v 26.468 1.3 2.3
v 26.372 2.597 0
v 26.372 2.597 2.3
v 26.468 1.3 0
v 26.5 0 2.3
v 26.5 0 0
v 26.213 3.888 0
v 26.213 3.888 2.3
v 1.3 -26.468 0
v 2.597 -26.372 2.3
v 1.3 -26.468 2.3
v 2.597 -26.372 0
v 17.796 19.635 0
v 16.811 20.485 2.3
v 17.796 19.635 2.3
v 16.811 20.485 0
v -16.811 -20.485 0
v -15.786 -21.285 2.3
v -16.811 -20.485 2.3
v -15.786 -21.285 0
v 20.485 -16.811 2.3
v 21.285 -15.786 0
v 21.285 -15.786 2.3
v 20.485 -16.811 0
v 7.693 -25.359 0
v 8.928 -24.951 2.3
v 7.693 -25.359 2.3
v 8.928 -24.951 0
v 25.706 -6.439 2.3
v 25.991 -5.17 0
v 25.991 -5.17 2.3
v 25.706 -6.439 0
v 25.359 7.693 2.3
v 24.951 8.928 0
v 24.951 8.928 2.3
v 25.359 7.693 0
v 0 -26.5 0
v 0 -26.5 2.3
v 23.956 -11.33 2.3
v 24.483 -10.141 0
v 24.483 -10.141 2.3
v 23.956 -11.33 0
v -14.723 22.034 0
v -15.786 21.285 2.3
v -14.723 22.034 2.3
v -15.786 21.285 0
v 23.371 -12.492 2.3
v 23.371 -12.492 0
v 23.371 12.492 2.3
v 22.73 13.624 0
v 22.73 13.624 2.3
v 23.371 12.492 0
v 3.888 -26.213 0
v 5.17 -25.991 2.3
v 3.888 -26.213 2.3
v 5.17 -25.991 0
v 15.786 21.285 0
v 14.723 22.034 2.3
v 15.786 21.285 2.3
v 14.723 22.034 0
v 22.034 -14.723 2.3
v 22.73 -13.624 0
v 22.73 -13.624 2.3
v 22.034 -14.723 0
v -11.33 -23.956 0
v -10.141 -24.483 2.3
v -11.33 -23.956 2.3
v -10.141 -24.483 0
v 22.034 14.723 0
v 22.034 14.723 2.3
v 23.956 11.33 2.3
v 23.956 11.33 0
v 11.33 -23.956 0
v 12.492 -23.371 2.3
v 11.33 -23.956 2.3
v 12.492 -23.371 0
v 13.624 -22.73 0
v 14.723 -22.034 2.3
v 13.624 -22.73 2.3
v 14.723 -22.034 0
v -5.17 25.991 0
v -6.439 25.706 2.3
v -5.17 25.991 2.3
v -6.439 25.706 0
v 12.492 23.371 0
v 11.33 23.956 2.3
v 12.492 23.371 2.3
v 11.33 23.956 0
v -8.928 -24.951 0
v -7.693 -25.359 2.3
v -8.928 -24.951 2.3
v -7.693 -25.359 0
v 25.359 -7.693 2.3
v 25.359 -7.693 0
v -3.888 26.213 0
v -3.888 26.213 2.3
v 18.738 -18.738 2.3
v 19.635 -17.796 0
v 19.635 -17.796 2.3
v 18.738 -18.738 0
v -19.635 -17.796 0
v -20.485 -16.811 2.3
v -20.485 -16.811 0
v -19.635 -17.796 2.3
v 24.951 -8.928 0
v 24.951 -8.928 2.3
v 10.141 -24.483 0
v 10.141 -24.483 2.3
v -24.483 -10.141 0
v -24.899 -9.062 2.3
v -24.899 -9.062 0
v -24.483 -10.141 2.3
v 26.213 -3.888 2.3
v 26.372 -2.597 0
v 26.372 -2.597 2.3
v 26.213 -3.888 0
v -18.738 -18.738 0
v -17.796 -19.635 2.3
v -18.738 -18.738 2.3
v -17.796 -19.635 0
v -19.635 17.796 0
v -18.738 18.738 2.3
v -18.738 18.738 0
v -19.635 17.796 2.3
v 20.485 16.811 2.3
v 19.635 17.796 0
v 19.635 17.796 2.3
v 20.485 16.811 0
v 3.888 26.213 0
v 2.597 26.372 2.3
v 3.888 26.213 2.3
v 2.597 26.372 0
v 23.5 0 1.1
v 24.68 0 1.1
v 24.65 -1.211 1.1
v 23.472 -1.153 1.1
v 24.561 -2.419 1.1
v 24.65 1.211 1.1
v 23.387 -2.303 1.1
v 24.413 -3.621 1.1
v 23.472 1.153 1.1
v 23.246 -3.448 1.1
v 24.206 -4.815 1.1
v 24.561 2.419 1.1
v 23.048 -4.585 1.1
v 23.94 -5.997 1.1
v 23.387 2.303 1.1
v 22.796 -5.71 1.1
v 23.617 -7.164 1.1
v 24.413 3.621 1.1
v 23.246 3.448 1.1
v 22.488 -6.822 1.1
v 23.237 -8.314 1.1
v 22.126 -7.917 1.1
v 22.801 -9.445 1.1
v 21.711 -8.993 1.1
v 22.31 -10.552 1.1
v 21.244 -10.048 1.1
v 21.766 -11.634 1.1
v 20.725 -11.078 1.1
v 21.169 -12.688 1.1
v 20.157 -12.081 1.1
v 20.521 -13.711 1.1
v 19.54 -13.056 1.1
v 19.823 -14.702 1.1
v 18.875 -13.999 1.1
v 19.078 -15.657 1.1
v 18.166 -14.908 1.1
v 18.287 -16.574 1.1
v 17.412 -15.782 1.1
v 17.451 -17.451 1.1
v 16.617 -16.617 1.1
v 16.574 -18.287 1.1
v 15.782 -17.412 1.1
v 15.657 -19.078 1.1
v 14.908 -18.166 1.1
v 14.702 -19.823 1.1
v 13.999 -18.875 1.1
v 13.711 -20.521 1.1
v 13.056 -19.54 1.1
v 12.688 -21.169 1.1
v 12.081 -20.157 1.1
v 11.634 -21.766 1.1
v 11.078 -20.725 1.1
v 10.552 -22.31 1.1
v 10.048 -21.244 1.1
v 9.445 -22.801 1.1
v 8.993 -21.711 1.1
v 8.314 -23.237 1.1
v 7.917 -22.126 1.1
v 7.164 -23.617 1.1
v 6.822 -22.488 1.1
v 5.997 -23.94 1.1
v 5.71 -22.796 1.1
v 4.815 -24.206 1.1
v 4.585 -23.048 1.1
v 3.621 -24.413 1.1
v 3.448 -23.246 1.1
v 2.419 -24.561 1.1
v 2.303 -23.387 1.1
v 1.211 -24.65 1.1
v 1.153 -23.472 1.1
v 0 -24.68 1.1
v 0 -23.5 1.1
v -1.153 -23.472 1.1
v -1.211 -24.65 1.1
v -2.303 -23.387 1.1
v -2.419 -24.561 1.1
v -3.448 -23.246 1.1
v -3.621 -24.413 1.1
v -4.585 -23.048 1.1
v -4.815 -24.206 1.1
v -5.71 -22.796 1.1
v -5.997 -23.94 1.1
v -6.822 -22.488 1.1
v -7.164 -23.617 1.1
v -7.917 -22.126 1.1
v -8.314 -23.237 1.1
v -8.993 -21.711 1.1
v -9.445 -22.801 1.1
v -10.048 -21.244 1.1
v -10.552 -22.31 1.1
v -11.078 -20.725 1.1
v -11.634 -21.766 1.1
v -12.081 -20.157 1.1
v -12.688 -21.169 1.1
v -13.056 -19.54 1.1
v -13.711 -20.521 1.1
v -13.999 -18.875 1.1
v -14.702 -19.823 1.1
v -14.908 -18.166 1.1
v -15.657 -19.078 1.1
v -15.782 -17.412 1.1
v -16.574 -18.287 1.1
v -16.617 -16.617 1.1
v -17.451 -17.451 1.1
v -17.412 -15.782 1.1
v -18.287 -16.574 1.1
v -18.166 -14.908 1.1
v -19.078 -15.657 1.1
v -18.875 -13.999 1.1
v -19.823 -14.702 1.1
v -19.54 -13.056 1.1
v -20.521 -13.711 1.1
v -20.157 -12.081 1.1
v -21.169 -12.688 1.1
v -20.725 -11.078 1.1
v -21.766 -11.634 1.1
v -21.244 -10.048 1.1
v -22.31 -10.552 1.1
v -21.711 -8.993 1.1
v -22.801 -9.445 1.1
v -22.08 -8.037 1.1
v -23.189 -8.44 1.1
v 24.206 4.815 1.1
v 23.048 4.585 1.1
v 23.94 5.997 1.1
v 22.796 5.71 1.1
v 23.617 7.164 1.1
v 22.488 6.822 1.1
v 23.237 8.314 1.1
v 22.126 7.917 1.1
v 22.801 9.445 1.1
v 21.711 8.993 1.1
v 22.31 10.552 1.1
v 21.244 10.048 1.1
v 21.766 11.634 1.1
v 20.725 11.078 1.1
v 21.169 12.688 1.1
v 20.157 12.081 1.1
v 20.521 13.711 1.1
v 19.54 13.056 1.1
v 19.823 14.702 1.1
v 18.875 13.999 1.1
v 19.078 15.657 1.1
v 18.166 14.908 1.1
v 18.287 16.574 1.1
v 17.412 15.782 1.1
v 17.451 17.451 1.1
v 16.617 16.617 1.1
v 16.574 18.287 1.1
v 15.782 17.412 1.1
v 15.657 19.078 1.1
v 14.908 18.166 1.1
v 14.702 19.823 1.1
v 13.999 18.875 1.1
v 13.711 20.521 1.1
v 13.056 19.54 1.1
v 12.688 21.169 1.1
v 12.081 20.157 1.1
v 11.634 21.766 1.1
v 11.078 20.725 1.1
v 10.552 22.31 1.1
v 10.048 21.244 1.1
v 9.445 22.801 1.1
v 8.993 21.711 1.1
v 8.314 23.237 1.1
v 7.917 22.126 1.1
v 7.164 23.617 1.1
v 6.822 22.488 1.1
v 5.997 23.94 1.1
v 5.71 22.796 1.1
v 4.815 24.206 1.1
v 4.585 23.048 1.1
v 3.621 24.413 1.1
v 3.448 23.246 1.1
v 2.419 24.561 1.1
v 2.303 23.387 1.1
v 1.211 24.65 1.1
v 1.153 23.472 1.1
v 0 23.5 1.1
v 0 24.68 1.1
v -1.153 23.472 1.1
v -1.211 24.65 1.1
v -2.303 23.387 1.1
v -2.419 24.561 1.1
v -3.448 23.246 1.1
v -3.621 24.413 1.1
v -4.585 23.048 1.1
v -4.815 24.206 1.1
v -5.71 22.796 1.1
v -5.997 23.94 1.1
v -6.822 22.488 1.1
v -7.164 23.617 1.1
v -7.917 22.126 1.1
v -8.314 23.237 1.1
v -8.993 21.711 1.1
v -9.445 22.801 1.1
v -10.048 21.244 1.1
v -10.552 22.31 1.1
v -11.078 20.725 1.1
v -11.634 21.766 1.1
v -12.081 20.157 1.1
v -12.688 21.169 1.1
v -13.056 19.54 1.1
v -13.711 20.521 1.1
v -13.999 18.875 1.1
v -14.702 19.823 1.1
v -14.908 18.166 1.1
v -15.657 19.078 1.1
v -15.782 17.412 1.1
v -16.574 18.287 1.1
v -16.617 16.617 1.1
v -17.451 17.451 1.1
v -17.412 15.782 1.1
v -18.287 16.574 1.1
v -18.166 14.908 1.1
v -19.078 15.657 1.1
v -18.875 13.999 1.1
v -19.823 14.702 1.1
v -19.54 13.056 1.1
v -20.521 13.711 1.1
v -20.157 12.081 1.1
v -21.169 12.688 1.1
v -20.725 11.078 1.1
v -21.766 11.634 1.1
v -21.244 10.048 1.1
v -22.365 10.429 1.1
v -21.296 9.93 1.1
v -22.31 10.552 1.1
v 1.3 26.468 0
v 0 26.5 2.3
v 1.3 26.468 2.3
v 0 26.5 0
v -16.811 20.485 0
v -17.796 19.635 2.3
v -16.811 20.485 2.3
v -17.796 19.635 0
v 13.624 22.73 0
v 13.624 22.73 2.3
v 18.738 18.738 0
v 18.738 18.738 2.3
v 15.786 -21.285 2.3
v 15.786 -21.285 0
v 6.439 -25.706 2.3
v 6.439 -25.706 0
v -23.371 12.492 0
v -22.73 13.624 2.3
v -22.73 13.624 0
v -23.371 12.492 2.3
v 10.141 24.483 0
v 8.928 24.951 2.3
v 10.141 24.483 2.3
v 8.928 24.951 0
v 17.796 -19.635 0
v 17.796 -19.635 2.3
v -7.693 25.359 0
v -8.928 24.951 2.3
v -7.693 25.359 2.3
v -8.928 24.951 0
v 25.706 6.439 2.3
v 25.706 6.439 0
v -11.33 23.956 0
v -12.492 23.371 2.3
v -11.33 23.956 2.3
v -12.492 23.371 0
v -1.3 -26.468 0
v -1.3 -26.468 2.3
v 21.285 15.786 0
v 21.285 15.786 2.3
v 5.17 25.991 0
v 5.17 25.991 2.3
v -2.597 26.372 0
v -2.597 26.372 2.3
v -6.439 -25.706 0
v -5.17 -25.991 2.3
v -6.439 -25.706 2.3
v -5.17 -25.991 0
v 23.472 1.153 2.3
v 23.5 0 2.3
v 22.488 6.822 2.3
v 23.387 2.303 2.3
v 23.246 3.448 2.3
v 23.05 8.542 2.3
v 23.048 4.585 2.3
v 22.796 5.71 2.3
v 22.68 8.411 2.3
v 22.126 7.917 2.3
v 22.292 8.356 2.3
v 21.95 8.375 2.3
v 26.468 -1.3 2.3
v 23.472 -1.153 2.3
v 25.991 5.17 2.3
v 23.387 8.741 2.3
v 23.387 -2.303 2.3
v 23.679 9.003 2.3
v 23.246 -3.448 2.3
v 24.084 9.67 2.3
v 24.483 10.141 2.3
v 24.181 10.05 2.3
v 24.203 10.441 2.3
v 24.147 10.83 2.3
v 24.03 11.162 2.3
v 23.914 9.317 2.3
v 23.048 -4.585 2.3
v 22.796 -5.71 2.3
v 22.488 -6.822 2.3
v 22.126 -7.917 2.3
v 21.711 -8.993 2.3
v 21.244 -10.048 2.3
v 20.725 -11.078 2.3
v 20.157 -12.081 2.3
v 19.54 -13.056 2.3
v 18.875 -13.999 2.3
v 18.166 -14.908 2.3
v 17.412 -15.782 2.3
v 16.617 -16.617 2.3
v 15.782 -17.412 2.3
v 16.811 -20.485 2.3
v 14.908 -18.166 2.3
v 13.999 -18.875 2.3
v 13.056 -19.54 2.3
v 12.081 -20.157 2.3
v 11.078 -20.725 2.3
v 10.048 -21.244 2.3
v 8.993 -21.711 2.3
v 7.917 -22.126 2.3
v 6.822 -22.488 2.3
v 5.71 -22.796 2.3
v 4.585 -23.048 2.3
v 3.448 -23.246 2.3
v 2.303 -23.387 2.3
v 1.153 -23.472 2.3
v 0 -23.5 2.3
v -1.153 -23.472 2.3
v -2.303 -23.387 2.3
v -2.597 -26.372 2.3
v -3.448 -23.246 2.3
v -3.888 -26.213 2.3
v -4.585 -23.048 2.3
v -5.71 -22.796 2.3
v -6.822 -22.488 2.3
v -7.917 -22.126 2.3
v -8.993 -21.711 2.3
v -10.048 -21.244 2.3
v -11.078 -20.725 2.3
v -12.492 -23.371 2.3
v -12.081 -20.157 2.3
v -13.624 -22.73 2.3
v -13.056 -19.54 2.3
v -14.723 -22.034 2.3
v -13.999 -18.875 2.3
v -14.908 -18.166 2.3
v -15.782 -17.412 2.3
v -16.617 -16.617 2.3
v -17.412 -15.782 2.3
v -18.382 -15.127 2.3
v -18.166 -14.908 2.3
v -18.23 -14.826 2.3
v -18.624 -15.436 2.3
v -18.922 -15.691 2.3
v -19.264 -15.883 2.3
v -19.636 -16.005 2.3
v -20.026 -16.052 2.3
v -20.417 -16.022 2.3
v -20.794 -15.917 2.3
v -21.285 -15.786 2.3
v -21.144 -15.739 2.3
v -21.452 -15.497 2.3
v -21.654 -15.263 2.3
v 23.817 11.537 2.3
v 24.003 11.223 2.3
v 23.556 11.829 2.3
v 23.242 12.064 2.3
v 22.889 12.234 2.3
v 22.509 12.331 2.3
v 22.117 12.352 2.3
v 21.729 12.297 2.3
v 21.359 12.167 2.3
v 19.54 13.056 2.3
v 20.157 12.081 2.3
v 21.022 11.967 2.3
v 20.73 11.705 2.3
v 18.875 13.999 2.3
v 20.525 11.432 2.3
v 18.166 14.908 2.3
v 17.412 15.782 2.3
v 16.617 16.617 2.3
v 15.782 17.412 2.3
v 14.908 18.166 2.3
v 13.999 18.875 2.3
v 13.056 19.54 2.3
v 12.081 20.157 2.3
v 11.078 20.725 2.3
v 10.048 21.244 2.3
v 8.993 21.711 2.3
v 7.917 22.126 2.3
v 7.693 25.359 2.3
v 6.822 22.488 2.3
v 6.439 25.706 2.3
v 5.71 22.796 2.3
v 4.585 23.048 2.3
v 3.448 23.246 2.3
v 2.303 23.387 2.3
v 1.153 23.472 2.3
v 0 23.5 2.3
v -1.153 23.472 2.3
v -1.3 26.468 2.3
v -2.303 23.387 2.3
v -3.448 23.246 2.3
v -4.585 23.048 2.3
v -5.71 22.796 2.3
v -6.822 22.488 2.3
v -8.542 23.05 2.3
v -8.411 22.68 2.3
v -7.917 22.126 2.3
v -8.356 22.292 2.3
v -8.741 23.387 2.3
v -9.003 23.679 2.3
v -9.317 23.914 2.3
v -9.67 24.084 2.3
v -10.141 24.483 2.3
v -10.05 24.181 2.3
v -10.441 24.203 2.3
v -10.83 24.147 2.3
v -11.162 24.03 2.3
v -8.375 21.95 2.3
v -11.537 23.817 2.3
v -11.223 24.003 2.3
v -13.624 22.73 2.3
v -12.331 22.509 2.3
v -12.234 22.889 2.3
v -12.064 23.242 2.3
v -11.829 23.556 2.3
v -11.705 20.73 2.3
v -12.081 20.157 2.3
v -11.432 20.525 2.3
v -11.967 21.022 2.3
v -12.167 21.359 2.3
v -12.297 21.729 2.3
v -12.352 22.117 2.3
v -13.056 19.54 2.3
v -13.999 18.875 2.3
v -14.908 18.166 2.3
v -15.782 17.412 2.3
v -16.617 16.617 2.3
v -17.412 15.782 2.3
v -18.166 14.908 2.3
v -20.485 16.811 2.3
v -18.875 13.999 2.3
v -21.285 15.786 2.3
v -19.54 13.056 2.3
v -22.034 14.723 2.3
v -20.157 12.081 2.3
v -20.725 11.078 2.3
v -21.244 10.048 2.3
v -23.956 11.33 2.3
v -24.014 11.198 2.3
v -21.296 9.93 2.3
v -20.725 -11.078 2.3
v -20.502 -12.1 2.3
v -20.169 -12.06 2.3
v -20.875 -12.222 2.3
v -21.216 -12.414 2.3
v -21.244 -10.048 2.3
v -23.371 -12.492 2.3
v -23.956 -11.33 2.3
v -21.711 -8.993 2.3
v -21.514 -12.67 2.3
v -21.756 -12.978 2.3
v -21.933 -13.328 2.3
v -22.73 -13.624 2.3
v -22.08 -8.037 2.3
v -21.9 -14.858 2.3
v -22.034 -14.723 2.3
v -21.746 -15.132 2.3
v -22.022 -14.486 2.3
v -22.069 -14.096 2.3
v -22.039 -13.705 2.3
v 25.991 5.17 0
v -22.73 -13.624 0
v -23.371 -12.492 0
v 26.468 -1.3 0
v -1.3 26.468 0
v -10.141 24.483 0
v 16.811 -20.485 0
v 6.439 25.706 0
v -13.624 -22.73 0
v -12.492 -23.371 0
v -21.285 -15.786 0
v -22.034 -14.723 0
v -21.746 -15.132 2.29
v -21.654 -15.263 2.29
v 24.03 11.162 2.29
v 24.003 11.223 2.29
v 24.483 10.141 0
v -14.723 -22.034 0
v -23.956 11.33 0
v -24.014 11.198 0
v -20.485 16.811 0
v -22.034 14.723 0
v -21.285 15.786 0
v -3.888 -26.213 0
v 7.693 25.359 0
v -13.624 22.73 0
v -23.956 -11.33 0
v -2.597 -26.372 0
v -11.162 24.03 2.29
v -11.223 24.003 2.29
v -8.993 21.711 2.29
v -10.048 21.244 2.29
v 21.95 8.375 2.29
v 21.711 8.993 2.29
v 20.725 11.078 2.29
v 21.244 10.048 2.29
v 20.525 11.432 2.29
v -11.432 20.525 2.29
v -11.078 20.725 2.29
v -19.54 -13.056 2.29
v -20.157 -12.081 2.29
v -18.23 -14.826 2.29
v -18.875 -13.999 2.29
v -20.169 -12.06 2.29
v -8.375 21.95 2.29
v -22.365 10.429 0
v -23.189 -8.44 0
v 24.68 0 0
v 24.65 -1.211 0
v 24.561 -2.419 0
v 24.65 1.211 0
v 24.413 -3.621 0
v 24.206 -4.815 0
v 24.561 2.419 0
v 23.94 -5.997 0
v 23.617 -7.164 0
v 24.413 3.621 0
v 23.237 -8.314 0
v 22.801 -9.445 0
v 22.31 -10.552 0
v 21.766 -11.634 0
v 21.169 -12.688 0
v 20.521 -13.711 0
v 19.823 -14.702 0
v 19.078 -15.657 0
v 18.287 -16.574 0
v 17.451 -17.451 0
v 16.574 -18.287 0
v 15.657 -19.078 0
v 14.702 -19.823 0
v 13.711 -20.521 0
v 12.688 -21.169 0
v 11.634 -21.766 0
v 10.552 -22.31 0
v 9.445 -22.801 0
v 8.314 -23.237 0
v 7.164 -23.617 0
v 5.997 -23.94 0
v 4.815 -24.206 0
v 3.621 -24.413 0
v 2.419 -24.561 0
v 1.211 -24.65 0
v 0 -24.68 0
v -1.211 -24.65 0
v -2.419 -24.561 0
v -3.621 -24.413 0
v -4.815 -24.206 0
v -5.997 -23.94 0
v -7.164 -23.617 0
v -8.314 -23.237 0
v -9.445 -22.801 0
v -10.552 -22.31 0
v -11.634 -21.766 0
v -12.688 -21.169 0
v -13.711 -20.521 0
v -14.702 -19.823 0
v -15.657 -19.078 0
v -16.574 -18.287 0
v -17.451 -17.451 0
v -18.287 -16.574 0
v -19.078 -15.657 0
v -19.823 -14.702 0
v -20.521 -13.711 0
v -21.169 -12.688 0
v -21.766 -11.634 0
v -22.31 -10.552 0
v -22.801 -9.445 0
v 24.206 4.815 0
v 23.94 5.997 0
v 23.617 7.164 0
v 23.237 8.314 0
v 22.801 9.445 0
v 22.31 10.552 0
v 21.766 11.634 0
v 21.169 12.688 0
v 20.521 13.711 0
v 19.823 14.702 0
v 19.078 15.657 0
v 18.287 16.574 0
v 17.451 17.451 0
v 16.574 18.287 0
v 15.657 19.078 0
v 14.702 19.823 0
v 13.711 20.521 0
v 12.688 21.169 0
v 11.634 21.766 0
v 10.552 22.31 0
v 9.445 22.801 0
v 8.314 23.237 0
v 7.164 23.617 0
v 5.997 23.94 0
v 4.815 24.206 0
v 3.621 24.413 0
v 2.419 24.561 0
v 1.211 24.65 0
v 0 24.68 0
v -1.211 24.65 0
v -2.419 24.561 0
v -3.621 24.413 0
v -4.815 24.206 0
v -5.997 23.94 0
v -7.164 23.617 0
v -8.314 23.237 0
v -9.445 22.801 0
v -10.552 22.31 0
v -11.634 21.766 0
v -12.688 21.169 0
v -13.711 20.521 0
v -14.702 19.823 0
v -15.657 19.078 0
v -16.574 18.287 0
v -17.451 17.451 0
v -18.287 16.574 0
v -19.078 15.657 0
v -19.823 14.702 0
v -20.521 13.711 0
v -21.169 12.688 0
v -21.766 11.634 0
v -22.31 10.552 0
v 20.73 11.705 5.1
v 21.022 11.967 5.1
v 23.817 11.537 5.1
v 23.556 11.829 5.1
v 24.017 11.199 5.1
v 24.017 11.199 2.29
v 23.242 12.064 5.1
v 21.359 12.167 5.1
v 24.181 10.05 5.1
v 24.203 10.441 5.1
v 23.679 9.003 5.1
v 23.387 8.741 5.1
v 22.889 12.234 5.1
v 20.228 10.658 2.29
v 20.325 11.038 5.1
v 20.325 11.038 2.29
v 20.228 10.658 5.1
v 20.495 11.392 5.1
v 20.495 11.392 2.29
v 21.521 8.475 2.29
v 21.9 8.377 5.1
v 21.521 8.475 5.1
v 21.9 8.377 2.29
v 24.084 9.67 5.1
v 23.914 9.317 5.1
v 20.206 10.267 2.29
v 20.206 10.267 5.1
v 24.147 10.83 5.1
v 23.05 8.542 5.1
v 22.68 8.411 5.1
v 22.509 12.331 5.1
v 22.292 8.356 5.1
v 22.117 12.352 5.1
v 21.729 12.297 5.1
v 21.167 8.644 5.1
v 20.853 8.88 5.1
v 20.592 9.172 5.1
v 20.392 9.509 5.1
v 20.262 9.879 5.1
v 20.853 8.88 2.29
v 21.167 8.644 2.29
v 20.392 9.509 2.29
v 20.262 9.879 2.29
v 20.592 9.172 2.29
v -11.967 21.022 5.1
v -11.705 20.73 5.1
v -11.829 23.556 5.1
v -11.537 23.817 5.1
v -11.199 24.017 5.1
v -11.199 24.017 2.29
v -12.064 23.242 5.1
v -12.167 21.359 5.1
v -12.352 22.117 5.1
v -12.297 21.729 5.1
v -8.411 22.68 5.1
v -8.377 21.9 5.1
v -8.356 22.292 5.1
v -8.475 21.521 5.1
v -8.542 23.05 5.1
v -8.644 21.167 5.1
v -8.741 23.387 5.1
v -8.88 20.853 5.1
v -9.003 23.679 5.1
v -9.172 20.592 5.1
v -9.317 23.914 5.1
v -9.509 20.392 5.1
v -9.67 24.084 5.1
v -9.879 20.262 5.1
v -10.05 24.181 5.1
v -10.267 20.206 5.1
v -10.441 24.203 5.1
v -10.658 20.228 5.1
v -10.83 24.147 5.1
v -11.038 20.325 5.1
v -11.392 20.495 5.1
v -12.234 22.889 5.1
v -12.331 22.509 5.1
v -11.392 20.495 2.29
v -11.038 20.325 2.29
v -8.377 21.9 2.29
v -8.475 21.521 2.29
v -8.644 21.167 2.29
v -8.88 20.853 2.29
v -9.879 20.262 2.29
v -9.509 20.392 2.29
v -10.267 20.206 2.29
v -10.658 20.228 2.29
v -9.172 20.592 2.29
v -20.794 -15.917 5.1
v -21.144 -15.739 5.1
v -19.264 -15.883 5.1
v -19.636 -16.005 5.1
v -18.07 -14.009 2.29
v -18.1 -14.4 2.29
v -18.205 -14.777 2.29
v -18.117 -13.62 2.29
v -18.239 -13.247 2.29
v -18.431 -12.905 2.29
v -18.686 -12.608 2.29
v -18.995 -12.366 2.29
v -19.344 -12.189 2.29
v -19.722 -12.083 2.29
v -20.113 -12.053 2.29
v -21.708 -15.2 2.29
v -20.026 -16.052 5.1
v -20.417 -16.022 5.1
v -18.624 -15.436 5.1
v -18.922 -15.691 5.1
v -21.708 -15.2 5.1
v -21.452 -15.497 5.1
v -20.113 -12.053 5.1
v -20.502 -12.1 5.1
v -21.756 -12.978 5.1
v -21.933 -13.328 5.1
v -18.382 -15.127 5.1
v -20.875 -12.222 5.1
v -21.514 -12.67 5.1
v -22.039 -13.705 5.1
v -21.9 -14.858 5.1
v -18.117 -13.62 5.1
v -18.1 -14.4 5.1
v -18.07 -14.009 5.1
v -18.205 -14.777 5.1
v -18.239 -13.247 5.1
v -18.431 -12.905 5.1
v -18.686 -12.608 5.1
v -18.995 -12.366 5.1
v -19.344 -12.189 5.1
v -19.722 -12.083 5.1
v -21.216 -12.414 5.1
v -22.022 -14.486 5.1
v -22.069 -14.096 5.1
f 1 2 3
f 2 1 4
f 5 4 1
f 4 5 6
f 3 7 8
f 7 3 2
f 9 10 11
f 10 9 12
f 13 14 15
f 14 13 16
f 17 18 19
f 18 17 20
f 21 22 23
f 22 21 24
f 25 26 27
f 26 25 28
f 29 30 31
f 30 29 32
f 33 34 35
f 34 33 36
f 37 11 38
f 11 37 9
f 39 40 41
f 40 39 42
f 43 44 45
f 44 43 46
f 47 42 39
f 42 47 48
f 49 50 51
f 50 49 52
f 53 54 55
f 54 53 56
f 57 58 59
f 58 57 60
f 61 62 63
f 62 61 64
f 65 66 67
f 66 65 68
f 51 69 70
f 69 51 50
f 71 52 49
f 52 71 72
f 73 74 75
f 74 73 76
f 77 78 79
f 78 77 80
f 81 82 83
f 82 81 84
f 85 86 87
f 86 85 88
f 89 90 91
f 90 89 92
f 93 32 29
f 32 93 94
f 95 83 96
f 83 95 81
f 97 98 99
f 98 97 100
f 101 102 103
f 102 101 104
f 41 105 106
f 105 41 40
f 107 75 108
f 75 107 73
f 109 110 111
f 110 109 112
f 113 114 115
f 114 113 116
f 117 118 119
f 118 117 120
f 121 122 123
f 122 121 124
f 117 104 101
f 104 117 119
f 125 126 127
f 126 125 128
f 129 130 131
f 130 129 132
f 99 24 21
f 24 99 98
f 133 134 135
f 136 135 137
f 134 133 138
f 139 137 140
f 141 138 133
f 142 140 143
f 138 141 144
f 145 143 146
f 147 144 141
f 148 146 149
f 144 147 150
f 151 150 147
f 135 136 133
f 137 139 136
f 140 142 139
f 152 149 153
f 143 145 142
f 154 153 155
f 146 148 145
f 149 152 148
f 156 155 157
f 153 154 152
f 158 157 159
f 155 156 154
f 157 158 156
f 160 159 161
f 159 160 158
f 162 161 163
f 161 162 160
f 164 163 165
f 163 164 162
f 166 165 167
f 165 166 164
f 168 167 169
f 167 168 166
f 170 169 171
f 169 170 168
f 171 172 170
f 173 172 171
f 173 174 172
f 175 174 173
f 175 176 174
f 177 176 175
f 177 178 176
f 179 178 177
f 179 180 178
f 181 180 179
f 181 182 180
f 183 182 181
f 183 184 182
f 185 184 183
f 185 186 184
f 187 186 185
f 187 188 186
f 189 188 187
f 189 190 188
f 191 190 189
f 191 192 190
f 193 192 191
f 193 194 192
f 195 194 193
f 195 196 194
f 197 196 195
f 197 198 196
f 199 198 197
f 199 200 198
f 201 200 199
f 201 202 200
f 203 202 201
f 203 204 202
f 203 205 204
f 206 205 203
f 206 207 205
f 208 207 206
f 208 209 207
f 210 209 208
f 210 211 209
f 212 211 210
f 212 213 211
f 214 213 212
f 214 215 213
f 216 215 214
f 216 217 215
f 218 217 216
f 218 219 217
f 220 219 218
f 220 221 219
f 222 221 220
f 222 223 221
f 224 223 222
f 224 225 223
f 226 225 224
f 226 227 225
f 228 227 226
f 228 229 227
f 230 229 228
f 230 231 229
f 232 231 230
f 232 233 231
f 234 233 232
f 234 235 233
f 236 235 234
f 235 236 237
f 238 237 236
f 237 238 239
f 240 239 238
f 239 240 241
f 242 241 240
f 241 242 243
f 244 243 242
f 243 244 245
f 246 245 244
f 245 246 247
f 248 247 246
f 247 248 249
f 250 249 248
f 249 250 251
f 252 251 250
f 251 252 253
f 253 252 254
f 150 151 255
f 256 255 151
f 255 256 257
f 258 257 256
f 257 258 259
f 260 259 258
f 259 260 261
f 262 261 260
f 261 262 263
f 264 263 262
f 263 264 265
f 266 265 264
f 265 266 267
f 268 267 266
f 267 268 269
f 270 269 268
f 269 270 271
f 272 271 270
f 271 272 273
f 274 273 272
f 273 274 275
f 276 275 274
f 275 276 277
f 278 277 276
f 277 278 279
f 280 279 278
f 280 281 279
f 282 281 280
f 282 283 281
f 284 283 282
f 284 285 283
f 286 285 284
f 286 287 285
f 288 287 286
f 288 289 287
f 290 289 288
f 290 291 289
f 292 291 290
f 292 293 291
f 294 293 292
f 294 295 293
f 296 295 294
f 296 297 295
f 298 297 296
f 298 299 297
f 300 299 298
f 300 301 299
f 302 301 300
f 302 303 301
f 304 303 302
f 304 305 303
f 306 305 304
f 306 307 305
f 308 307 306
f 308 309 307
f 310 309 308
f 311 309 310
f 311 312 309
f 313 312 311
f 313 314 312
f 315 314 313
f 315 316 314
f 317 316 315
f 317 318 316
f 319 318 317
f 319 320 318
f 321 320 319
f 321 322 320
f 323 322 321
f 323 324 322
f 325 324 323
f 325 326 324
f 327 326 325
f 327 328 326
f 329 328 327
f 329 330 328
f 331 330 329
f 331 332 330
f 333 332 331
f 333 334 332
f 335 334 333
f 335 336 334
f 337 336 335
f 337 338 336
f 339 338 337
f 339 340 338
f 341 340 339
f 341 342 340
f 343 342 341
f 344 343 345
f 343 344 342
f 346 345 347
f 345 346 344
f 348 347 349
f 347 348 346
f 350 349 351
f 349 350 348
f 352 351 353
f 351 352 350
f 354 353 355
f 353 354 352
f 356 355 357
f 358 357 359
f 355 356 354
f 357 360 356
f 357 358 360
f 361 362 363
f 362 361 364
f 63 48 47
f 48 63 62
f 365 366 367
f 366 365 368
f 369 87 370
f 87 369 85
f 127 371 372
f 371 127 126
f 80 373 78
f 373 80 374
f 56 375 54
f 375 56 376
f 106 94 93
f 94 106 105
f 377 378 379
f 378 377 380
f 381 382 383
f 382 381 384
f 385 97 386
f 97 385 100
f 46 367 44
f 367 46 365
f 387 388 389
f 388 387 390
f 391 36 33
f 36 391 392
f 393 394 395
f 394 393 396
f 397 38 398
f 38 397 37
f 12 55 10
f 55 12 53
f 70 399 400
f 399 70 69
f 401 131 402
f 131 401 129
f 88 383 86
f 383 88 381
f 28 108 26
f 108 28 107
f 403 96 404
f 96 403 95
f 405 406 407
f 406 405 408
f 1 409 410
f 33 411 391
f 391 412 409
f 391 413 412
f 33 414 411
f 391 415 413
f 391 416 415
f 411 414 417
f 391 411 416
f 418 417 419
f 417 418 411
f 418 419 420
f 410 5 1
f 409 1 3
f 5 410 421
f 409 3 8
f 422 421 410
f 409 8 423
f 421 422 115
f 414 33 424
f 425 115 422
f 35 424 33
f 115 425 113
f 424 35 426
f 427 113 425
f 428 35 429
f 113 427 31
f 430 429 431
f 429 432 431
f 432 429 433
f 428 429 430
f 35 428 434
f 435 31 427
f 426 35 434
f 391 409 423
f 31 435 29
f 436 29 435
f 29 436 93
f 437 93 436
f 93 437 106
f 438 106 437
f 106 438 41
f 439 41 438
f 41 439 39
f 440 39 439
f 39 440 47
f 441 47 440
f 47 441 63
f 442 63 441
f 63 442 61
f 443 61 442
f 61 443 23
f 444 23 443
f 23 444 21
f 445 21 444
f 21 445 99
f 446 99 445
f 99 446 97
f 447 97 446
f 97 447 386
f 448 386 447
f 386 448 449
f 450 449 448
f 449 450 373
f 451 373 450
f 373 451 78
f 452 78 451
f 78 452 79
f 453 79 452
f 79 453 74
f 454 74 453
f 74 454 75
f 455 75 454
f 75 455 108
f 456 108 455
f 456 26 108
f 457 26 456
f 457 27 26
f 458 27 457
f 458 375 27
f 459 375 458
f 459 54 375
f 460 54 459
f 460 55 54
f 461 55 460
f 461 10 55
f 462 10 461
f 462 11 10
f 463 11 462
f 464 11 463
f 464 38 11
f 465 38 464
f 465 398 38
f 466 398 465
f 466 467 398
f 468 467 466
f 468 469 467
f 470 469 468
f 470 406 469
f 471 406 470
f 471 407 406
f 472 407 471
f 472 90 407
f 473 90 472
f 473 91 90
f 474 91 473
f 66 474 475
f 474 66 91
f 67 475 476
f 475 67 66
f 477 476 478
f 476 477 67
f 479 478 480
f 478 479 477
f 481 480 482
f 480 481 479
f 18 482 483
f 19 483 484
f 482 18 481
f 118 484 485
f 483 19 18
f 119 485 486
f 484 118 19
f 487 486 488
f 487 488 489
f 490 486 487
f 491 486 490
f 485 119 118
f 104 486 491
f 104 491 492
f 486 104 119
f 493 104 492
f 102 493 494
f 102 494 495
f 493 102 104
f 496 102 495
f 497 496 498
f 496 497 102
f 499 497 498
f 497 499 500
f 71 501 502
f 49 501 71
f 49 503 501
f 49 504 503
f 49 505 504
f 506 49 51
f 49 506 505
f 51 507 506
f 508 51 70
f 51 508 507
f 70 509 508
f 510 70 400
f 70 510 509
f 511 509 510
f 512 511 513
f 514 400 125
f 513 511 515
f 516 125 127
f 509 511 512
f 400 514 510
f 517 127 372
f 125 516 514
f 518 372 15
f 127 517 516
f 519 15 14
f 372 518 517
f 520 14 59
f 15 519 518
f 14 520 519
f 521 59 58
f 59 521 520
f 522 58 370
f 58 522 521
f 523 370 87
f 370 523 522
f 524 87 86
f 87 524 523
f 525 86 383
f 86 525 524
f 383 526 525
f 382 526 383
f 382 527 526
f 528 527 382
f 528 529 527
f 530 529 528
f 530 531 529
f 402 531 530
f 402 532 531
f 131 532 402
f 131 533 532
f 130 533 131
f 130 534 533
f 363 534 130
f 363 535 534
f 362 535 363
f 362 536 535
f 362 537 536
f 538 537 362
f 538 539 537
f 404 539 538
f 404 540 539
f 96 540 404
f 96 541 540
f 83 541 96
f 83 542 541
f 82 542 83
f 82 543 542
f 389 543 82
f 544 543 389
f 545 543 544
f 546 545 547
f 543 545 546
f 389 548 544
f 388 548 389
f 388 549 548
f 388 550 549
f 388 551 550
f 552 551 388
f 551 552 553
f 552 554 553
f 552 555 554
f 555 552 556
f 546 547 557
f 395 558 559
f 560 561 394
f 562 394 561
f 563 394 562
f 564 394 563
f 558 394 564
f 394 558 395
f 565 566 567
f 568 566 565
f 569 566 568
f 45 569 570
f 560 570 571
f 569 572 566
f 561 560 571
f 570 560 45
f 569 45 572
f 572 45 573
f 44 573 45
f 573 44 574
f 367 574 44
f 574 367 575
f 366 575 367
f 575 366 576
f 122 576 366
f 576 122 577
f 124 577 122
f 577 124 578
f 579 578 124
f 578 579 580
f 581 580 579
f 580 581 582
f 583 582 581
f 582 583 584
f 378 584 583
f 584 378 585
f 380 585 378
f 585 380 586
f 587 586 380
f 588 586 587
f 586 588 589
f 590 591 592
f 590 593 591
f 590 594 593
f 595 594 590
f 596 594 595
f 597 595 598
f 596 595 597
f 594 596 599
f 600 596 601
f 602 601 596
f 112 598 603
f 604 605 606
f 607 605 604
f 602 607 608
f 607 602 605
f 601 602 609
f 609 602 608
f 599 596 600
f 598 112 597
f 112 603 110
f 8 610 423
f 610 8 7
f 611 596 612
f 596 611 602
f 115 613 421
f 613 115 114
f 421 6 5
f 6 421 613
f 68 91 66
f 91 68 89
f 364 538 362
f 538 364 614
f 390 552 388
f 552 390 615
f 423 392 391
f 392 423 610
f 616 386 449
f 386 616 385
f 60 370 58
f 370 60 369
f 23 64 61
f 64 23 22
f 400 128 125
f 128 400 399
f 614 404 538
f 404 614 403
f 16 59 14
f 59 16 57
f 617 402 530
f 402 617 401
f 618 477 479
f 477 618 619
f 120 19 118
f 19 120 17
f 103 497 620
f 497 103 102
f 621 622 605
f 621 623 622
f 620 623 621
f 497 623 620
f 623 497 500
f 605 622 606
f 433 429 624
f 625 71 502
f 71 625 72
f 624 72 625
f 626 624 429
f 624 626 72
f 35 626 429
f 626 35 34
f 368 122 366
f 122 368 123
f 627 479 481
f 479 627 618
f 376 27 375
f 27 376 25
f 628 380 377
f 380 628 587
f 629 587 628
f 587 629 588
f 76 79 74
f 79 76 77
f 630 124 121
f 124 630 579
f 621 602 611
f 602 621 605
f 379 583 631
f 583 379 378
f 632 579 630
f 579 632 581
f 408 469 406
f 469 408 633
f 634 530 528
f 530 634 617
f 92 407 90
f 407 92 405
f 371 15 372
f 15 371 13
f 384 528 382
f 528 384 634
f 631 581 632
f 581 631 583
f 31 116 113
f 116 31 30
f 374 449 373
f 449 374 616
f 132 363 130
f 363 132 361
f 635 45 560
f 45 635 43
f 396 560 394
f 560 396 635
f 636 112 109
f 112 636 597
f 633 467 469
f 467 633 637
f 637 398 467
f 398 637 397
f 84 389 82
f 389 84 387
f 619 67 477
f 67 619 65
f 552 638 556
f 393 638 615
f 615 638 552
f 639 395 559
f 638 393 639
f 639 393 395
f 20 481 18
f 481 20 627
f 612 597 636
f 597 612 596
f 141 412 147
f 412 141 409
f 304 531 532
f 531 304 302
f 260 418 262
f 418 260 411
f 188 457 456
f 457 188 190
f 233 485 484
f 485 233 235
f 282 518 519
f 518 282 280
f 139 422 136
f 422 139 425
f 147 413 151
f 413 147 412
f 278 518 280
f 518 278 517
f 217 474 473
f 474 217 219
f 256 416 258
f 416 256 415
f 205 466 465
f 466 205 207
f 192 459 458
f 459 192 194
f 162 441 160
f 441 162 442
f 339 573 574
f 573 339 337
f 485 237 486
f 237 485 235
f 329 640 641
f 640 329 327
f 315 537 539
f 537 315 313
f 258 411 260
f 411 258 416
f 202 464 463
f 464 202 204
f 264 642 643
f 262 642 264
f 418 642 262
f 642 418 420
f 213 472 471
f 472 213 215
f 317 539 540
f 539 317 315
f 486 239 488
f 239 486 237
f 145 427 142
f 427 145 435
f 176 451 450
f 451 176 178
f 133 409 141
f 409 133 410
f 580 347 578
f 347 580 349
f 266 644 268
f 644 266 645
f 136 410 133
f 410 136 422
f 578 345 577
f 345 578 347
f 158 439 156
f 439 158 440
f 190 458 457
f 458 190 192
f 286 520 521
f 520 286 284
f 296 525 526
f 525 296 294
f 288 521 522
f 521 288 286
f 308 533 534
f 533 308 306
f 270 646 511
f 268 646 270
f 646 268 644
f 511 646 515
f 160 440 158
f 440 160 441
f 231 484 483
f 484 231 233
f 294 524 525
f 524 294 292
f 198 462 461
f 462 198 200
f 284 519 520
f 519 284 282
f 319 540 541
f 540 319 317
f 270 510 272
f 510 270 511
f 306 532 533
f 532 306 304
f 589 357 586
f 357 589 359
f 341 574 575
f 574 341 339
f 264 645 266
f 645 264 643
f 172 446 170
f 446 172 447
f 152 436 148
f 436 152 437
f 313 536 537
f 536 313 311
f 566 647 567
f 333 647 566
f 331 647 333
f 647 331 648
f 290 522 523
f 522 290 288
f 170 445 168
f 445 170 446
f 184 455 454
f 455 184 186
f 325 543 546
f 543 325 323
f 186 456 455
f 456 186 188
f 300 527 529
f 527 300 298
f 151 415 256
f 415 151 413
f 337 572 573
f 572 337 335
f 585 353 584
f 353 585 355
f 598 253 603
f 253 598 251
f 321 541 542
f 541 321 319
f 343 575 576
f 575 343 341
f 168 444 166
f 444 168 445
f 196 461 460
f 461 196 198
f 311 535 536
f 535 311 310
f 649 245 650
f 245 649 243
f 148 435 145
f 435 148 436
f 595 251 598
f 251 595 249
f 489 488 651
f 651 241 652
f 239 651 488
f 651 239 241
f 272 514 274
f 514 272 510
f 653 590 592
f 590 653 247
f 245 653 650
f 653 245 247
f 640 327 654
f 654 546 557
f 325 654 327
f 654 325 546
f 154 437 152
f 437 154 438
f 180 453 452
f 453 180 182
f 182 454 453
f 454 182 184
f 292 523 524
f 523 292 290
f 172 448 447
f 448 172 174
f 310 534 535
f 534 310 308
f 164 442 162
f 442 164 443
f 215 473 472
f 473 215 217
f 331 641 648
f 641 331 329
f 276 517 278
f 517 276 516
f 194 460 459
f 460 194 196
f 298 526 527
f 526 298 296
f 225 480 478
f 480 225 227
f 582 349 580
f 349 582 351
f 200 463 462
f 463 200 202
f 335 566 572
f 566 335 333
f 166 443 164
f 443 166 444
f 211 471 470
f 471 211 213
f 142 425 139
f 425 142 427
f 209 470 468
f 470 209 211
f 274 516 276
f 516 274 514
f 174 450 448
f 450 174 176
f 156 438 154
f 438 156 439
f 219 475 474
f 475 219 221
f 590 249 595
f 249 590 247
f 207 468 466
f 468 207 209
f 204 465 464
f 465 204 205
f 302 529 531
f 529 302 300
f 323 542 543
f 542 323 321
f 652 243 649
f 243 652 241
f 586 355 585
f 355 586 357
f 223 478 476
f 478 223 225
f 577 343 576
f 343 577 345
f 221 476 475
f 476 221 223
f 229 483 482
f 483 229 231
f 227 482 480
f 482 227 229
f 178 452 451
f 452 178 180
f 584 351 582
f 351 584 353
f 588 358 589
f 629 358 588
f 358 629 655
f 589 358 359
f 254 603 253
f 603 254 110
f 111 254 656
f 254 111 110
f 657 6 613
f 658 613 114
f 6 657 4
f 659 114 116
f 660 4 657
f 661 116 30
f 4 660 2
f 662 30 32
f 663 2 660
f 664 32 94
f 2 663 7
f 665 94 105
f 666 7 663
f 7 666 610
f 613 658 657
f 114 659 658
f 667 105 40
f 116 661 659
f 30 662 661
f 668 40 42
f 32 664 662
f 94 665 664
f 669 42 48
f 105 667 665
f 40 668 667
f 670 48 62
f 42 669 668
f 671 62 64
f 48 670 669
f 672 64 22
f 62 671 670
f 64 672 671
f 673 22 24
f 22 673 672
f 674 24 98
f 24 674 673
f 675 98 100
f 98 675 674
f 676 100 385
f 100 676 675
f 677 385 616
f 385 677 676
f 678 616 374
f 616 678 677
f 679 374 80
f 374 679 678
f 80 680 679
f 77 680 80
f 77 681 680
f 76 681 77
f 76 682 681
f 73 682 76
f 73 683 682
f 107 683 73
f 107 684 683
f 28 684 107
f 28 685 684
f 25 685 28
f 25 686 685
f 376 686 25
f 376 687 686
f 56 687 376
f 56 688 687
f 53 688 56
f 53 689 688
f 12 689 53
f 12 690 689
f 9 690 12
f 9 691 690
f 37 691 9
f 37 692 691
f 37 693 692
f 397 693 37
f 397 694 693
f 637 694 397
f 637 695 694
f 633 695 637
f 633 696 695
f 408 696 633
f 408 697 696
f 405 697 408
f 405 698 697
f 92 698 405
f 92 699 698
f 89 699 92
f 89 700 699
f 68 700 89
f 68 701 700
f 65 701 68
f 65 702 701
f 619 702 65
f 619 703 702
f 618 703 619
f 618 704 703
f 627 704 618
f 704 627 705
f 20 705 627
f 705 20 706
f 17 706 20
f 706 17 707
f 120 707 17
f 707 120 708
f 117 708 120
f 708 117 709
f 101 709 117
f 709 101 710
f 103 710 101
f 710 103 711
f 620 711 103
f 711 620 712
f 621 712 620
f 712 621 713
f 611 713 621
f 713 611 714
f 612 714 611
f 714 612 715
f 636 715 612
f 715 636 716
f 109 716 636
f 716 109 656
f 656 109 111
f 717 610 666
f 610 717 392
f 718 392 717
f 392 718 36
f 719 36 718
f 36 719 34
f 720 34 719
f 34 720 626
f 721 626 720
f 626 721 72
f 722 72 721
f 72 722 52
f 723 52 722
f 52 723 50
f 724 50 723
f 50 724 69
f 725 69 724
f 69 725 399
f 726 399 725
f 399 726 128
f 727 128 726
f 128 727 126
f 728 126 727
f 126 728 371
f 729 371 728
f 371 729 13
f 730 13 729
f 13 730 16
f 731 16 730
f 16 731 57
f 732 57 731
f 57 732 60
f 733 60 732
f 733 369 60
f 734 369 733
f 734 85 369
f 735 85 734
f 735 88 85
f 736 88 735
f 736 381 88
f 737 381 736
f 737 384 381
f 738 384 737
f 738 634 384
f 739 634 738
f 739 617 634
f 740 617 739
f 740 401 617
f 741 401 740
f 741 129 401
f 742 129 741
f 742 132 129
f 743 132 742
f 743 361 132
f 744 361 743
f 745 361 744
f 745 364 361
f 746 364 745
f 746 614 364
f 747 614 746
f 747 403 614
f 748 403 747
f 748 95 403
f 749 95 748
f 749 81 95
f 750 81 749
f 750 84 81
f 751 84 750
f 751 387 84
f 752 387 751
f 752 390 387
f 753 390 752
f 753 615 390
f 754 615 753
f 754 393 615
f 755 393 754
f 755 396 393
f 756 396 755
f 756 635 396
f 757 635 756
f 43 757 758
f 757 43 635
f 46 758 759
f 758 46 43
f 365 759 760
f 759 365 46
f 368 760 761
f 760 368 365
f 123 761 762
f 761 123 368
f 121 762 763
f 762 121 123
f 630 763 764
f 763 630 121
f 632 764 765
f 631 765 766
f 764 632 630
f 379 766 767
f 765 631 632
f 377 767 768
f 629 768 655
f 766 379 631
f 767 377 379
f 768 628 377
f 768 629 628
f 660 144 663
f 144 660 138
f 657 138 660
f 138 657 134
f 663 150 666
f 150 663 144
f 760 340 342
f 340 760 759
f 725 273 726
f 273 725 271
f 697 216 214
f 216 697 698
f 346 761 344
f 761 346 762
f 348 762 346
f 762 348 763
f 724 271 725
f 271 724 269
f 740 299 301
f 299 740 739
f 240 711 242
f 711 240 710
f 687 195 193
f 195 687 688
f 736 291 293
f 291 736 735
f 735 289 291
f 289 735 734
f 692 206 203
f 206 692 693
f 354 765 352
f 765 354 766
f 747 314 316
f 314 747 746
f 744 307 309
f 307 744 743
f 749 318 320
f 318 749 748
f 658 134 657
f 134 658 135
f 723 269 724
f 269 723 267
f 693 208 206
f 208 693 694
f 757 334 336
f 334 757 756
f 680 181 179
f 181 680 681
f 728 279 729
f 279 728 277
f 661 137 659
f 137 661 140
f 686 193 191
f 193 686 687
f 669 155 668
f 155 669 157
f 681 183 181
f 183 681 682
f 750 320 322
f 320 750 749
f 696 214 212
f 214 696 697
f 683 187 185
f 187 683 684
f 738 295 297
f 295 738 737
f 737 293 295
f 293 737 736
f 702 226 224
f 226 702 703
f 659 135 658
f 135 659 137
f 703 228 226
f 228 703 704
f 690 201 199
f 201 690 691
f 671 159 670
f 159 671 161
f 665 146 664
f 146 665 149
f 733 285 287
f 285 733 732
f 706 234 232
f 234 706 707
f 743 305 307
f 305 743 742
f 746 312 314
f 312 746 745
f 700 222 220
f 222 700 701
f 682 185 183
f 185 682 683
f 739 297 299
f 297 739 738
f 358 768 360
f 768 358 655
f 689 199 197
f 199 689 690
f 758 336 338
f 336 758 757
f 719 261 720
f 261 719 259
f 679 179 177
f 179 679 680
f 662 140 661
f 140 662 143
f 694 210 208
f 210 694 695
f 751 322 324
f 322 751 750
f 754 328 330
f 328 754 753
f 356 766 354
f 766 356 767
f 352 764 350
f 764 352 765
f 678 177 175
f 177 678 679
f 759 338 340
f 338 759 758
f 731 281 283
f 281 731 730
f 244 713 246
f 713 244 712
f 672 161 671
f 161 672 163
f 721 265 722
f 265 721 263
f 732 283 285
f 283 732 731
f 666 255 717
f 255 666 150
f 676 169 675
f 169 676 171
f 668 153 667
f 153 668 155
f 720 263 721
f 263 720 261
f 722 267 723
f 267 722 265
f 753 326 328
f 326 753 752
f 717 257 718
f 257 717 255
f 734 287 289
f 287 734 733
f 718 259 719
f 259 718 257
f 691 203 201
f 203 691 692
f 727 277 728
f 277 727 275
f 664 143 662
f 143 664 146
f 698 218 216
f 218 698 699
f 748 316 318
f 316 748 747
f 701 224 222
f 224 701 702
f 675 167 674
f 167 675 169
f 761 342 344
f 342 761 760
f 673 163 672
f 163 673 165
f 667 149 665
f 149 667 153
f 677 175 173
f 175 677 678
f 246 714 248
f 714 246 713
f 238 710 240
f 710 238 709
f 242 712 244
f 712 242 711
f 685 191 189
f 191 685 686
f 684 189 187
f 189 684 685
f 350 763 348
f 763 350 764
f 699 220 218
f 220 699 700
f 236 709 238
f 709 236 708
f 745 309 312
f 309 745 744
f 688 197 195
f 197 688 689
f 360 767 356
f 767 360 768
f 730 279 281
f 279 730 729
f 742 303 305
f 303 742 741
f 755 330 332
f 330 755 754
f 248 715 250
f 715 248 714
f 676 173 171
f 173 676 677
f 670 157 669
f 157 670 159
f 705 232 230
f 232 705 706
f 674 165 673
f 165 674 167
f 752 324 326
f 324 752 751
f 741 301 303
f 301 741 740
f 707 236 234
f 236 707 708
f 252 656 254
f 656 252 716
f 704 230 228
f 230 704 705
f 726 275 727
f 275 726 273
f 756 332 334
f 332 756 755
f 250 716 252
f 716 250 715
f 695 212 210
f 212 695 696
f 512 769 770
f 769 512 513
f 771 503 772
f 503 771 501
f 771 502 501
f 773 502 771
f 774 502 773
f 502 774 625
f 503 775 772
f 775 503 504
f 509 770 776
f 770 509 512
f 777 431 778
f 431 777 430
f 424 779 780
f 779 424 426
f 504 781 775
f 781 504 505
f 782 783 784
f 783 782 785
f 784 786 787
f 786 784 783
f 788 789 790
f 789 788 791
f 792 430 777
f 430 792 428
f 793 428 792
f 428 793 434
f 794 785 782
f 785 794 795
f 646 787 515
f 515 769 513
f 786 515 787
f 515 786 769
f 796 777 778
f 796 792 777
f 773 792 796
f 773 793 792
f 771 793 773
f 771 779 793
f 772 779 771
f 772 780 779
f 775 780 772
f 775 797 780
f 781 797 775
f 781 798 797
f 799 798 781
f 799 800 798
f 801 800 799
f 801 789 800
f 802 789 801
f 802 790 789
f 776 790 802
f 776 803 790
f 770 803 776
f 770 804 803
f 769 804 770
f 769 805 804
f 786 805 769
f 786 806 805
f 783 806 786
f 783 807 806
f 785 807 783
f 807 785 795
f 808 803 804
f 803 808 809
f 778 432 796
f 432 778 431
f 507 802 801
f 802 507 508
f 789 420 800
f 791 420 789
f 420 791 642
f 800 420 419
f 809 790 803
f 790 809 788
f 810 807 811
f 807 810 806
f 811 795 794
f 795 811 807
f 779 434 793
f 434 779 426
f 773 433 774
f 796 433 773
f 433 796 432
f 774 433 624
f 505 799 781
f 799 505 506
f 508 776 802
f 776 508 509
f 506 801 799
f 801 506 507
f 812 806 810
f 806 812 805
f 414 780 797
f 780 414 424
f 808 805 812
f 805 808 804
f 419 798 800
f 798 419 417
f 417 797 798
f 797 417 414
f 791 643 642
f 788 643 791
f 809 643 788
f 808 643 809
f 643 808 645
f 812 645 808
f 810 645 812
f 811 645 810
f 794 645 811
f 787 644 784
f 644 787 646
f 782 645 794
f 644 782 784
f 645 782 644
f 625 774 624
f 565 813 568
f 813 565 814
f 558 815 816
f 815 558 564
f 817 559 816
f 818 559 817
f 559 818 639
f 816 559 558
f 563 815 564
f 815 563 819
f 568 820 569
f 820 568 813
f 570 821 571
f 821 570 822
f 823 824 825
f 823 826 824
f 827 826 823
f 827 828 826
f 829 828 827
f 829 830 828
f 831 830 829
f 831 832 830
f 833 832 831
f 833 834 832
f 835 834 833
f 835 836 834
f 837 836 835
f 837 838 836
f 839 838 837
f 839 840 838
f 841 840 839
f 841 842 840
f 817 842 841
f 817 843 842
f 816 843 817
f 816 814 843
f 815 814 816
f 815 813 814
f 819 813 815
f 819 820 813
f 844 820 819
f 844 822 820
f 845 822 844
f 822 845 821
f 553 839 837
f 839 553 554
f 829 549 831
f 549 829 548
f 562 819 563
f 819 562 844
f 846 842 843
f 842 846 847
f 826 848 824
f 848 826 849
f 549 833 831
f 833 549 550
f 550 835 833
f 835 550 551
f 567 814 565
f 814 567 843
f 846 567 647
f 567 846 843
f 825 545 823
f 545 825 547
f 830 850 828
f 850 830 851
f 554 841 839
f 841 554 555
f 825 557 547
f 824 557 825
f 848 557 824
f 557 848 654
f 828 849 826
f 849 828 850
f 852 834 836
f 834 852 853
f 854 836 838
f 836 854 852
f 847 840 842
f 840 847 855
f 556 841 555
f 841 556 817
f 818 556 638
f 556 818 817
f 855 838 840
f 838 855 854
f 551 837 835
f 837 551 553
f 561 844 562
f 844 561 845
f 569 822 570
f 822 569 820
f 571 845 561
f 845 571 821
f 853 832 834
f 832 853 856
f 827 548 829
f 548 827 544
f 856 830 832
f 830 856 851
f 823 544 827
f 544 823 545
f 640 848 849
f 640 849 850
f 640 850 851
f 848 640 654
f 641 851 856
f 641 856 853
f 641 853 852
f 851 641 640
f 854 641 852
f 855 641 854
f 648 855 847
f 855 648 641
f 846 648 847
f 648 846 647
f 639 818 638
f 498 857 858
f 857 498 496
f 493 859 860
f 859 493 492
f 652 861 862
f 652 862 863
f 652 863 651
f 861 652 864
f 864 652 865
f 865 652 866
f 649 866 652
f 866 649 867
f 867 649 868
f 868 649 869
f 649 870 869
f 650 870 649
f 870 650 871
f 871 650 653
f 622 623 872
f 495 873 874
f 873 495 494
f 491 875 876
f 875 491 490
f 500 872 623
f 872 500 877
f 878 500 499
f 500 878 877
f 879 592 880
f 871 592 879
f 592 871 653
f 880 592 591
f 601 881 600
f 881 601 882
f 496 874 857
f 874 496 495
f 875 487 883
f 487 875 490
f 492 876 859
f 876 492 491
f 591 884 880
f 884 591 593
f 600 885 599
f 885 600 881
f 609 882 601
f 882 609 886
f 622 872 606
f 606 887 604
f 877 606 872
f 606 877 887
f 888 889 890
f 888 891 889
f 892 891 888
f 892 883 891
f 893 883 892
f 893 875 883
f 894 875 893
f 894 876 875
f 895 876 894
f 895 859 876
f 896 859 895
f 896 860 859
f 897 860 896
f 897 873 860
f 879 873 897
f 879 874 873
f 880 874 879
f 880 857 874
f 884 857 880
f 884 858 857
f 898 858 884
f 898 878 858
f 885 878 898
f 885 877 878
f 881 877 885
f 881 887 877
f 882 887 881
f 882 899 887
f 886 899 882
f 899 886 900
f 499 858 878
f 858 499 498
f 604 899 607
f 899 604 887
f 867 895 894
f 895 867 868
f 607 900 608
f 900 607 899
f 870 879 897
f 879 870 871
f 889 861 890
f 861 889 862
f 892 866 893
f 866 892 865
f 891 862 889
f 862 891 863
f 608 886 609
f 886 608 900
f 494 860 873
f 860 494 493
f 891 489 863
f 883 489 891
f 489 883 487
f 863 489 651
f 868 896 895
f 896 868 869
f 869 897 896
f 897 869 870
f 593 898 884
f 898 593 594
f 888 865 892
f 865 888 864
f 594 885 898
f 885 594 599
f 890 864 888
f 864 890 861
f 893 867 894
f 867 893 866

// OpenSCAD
// Rev B bench fixtures: the two printed spacers the bench boards need (docs/rev-b-bench.md).
// Not part of the product: dial_spinner.scad models the device, this file only the bench.
//
//   bench_panel_spacer  holds the 1.75" panel face-up 4 mm over the AMOLED shield, glass on a ledge
//   bench_nfc_spacer    holds the NFC coil plate 3.0 mm over the NFC base, pinned through both boards
//
// Board positions are in the shield's own frame: origin at the glass outline's centre, x toward the
// shield's +x, y UP (KiCad's y is down).  tests/test_bench.py holds these constants to layout.py.

part = "bench_panel_spacer";
fn_big = 128;
fn_small = 32;

// ---- panel spacer -------------------------------------------------------------------------------
GLASS_D      = 48.96;     // Huaxin cover glass (Viewe Ø48.16 sits in the same pocket with 0.4 of play)
GLASS_T      = 1.1;       // cover glass, Huaxin drawing side view
PANEL_BODY_D = 46.35;     // bare panel, largest dimension: must pass inside the ledge
GLASS_Z      = 4.0;       // glass underside above the shield top (the 4 mm the silk says)
HEADER_Z     = 2.54;      // male header plastic on the shield's top: the ring flies over it
RING_Z0      = 2.8;       // ring underside: HEADER_Z + 0.26
RING_RO      = 26.5;
LEDGE_RI     = 23.5;      // glass rests on r 23.5-24.6; the panel body (r <= 23.18) hangs inside
POCKET_D     = GLASS_D + 0.4;
LIP_H        = GLASS_T;   // lip flush with the glass top
FOOT_D       = 4.0;
FOOT_R       = 24.5;
// Clear spots on the routed board at r 24.5 about the glass centre, from a scan of every courtyard and
// pad (>= 0.5 mm clear for a Ø4 foot): 0-55, 100-140, 200-230, 305-355 deg.  These three are each
// >= 7 mm from the nearest part.  Theta CCW seen from the top, 0 toward the shield's +x.
FOOT_THETA   = [25, 115, 215];
// The tail folds under at the panel's left edge (theta 180) to reach J2.  Open the ring there.
TAIL_GAP     = [155, 200];

// ---- NFC stack spacer ---------------------------------------------------------------------------
// Prints flat with nothing hanging: M2 x 4 screws from under the base (its Ø2.2 holes) self-tap into the
// spacer's Ø1.6 holes, and the plate drops in between three tabs at its edge.  Pins both ways would need
// support for one set or the other.
PLATE_HOLE_R = 19.0;      // the locating holes in both boards (layout.py PLATE_HOLE_R)
PLATE_HOLES  = [30, 150, 270];
TAP_D        = 1.6;       // M2 self-tapping into printed plastic
PLATE_R      = 26.6;      // coil plate edge (layout.py PLATE_R)
PLATE_T      = 0.4;
FERRITE_T    = 0.24;      // IFL05K with its adhesive, stuck to the plate's bottom
STACK_GAP    = 3.0;       // base top to plate bottom: puts the coil 3.4 over ground copper, as in the device
NFC_H        = STACK_GAP - FERRITE_T;   // the spacer meets the ferrite, not the plate
NFC_RI       = 16.5;
NFC_RO       = 21.5;      // inside the base's coil contacts W1/W2 (r 22-24, theta 190-210)
ARM_W        = 4.0;
TAB_RI       = PLATE_R + 0.1;           // 0.1 radial play around the plate
TAB_RO       = TAB_RI + 1.0;
TAB_TOP      = STACK_GAP + PLATE_T;     // flush with the plate top: the panel sits on the plate, not the tabs
TAB_W        = 20;        // degrees of arc per tab

// ---- modules (constants above: scadvars reads up to the first module) ------------------------------

// An annulus, optionally with the sector gap[0]..gap[1] (degrees, CCW) cut out of it.
module arc_ring(ri, ro, z0, z1, gap = [0, 0]) {
    difference() {
        translate([0, 0, z0]) difference() {
            cylinder(r = ro, h = z1 - z0, $fn = fn_big);
            translate([0, 0, -0.1]) cylinder(r = ri, h = z1 - z0 + 0.2, $fn = fn_big);
        }
        if (gap[1] > gap[0])
            translate([0, 0, z0 - 0.1]) linear_extrude(z1 - z0 + 0.2)
                polygon(concat([[0, 0]], [for (a = [gap[0] : 2.5 : gap[1]]) 2 * ro * [cos(a), sin(a)]]));
    }
}

module bench_panel_spacer() {
    // ring under the glass edge: ledge at GLASS_Z, lip up to the glass top
    arc_ring(LEDGE_RI, RING_RO, RING_Z0, GLASS_Z, TAIL_GAP);
    arc_ring(POCKET_D / 2, RING_RO, GLASS_Z - 0.01, GLASS_Z + LIP_H, TAIL_GAP);   // overlap: one solid
    for (a = FOOT_THETA) rotate(a) translate([FOOT_R, 0, 0])
        cylinder(d = FOOT_D, h = RING_Z0 + 0.01, $fn = fn_small);
}

module bench_nfc_spacer() {
    difference() {
        union() {
            arc_ring(NFC_RI, NFC_RO, 0, NFC_H);
            for (a = PLATE_HOLES) rotate(a) {
                translate([NFC_RO - 0.5, -ARM_W / 2, 0]) cube([TAB_RO - NFC_RO + 0.5, ARM_W, NFC_H]);
                arc_ring(TAB_RI, TAB_RO, 0, TAB_TOP, [TAB_W / 2, 360 - TAB_W / 2]);
            }
        }
        for (a = PLATE_HOLES) rotate(a) translate([PLATE_HOLE_R, 0, -0.1])
            cylinder(d = TAP_D, h = NFC_H + 0.2, $fn = fn_small);
    }
}

// Exported in print orientation: the panel spacer lip-down (the ring then bridges nothing and the feet
// grow upward), the NFC spacer as modelled.
if (part == "bench_panel_spacer") translate([0, 0, GLASS_Z + LIP_H]) mirror([0, 0, 1]) bench_panel_spacer();
else if (part == "bench_nfc_spacer") bench_nfc_spacer();
else if (part == "assembly_panel") bench_panel_spacer();
